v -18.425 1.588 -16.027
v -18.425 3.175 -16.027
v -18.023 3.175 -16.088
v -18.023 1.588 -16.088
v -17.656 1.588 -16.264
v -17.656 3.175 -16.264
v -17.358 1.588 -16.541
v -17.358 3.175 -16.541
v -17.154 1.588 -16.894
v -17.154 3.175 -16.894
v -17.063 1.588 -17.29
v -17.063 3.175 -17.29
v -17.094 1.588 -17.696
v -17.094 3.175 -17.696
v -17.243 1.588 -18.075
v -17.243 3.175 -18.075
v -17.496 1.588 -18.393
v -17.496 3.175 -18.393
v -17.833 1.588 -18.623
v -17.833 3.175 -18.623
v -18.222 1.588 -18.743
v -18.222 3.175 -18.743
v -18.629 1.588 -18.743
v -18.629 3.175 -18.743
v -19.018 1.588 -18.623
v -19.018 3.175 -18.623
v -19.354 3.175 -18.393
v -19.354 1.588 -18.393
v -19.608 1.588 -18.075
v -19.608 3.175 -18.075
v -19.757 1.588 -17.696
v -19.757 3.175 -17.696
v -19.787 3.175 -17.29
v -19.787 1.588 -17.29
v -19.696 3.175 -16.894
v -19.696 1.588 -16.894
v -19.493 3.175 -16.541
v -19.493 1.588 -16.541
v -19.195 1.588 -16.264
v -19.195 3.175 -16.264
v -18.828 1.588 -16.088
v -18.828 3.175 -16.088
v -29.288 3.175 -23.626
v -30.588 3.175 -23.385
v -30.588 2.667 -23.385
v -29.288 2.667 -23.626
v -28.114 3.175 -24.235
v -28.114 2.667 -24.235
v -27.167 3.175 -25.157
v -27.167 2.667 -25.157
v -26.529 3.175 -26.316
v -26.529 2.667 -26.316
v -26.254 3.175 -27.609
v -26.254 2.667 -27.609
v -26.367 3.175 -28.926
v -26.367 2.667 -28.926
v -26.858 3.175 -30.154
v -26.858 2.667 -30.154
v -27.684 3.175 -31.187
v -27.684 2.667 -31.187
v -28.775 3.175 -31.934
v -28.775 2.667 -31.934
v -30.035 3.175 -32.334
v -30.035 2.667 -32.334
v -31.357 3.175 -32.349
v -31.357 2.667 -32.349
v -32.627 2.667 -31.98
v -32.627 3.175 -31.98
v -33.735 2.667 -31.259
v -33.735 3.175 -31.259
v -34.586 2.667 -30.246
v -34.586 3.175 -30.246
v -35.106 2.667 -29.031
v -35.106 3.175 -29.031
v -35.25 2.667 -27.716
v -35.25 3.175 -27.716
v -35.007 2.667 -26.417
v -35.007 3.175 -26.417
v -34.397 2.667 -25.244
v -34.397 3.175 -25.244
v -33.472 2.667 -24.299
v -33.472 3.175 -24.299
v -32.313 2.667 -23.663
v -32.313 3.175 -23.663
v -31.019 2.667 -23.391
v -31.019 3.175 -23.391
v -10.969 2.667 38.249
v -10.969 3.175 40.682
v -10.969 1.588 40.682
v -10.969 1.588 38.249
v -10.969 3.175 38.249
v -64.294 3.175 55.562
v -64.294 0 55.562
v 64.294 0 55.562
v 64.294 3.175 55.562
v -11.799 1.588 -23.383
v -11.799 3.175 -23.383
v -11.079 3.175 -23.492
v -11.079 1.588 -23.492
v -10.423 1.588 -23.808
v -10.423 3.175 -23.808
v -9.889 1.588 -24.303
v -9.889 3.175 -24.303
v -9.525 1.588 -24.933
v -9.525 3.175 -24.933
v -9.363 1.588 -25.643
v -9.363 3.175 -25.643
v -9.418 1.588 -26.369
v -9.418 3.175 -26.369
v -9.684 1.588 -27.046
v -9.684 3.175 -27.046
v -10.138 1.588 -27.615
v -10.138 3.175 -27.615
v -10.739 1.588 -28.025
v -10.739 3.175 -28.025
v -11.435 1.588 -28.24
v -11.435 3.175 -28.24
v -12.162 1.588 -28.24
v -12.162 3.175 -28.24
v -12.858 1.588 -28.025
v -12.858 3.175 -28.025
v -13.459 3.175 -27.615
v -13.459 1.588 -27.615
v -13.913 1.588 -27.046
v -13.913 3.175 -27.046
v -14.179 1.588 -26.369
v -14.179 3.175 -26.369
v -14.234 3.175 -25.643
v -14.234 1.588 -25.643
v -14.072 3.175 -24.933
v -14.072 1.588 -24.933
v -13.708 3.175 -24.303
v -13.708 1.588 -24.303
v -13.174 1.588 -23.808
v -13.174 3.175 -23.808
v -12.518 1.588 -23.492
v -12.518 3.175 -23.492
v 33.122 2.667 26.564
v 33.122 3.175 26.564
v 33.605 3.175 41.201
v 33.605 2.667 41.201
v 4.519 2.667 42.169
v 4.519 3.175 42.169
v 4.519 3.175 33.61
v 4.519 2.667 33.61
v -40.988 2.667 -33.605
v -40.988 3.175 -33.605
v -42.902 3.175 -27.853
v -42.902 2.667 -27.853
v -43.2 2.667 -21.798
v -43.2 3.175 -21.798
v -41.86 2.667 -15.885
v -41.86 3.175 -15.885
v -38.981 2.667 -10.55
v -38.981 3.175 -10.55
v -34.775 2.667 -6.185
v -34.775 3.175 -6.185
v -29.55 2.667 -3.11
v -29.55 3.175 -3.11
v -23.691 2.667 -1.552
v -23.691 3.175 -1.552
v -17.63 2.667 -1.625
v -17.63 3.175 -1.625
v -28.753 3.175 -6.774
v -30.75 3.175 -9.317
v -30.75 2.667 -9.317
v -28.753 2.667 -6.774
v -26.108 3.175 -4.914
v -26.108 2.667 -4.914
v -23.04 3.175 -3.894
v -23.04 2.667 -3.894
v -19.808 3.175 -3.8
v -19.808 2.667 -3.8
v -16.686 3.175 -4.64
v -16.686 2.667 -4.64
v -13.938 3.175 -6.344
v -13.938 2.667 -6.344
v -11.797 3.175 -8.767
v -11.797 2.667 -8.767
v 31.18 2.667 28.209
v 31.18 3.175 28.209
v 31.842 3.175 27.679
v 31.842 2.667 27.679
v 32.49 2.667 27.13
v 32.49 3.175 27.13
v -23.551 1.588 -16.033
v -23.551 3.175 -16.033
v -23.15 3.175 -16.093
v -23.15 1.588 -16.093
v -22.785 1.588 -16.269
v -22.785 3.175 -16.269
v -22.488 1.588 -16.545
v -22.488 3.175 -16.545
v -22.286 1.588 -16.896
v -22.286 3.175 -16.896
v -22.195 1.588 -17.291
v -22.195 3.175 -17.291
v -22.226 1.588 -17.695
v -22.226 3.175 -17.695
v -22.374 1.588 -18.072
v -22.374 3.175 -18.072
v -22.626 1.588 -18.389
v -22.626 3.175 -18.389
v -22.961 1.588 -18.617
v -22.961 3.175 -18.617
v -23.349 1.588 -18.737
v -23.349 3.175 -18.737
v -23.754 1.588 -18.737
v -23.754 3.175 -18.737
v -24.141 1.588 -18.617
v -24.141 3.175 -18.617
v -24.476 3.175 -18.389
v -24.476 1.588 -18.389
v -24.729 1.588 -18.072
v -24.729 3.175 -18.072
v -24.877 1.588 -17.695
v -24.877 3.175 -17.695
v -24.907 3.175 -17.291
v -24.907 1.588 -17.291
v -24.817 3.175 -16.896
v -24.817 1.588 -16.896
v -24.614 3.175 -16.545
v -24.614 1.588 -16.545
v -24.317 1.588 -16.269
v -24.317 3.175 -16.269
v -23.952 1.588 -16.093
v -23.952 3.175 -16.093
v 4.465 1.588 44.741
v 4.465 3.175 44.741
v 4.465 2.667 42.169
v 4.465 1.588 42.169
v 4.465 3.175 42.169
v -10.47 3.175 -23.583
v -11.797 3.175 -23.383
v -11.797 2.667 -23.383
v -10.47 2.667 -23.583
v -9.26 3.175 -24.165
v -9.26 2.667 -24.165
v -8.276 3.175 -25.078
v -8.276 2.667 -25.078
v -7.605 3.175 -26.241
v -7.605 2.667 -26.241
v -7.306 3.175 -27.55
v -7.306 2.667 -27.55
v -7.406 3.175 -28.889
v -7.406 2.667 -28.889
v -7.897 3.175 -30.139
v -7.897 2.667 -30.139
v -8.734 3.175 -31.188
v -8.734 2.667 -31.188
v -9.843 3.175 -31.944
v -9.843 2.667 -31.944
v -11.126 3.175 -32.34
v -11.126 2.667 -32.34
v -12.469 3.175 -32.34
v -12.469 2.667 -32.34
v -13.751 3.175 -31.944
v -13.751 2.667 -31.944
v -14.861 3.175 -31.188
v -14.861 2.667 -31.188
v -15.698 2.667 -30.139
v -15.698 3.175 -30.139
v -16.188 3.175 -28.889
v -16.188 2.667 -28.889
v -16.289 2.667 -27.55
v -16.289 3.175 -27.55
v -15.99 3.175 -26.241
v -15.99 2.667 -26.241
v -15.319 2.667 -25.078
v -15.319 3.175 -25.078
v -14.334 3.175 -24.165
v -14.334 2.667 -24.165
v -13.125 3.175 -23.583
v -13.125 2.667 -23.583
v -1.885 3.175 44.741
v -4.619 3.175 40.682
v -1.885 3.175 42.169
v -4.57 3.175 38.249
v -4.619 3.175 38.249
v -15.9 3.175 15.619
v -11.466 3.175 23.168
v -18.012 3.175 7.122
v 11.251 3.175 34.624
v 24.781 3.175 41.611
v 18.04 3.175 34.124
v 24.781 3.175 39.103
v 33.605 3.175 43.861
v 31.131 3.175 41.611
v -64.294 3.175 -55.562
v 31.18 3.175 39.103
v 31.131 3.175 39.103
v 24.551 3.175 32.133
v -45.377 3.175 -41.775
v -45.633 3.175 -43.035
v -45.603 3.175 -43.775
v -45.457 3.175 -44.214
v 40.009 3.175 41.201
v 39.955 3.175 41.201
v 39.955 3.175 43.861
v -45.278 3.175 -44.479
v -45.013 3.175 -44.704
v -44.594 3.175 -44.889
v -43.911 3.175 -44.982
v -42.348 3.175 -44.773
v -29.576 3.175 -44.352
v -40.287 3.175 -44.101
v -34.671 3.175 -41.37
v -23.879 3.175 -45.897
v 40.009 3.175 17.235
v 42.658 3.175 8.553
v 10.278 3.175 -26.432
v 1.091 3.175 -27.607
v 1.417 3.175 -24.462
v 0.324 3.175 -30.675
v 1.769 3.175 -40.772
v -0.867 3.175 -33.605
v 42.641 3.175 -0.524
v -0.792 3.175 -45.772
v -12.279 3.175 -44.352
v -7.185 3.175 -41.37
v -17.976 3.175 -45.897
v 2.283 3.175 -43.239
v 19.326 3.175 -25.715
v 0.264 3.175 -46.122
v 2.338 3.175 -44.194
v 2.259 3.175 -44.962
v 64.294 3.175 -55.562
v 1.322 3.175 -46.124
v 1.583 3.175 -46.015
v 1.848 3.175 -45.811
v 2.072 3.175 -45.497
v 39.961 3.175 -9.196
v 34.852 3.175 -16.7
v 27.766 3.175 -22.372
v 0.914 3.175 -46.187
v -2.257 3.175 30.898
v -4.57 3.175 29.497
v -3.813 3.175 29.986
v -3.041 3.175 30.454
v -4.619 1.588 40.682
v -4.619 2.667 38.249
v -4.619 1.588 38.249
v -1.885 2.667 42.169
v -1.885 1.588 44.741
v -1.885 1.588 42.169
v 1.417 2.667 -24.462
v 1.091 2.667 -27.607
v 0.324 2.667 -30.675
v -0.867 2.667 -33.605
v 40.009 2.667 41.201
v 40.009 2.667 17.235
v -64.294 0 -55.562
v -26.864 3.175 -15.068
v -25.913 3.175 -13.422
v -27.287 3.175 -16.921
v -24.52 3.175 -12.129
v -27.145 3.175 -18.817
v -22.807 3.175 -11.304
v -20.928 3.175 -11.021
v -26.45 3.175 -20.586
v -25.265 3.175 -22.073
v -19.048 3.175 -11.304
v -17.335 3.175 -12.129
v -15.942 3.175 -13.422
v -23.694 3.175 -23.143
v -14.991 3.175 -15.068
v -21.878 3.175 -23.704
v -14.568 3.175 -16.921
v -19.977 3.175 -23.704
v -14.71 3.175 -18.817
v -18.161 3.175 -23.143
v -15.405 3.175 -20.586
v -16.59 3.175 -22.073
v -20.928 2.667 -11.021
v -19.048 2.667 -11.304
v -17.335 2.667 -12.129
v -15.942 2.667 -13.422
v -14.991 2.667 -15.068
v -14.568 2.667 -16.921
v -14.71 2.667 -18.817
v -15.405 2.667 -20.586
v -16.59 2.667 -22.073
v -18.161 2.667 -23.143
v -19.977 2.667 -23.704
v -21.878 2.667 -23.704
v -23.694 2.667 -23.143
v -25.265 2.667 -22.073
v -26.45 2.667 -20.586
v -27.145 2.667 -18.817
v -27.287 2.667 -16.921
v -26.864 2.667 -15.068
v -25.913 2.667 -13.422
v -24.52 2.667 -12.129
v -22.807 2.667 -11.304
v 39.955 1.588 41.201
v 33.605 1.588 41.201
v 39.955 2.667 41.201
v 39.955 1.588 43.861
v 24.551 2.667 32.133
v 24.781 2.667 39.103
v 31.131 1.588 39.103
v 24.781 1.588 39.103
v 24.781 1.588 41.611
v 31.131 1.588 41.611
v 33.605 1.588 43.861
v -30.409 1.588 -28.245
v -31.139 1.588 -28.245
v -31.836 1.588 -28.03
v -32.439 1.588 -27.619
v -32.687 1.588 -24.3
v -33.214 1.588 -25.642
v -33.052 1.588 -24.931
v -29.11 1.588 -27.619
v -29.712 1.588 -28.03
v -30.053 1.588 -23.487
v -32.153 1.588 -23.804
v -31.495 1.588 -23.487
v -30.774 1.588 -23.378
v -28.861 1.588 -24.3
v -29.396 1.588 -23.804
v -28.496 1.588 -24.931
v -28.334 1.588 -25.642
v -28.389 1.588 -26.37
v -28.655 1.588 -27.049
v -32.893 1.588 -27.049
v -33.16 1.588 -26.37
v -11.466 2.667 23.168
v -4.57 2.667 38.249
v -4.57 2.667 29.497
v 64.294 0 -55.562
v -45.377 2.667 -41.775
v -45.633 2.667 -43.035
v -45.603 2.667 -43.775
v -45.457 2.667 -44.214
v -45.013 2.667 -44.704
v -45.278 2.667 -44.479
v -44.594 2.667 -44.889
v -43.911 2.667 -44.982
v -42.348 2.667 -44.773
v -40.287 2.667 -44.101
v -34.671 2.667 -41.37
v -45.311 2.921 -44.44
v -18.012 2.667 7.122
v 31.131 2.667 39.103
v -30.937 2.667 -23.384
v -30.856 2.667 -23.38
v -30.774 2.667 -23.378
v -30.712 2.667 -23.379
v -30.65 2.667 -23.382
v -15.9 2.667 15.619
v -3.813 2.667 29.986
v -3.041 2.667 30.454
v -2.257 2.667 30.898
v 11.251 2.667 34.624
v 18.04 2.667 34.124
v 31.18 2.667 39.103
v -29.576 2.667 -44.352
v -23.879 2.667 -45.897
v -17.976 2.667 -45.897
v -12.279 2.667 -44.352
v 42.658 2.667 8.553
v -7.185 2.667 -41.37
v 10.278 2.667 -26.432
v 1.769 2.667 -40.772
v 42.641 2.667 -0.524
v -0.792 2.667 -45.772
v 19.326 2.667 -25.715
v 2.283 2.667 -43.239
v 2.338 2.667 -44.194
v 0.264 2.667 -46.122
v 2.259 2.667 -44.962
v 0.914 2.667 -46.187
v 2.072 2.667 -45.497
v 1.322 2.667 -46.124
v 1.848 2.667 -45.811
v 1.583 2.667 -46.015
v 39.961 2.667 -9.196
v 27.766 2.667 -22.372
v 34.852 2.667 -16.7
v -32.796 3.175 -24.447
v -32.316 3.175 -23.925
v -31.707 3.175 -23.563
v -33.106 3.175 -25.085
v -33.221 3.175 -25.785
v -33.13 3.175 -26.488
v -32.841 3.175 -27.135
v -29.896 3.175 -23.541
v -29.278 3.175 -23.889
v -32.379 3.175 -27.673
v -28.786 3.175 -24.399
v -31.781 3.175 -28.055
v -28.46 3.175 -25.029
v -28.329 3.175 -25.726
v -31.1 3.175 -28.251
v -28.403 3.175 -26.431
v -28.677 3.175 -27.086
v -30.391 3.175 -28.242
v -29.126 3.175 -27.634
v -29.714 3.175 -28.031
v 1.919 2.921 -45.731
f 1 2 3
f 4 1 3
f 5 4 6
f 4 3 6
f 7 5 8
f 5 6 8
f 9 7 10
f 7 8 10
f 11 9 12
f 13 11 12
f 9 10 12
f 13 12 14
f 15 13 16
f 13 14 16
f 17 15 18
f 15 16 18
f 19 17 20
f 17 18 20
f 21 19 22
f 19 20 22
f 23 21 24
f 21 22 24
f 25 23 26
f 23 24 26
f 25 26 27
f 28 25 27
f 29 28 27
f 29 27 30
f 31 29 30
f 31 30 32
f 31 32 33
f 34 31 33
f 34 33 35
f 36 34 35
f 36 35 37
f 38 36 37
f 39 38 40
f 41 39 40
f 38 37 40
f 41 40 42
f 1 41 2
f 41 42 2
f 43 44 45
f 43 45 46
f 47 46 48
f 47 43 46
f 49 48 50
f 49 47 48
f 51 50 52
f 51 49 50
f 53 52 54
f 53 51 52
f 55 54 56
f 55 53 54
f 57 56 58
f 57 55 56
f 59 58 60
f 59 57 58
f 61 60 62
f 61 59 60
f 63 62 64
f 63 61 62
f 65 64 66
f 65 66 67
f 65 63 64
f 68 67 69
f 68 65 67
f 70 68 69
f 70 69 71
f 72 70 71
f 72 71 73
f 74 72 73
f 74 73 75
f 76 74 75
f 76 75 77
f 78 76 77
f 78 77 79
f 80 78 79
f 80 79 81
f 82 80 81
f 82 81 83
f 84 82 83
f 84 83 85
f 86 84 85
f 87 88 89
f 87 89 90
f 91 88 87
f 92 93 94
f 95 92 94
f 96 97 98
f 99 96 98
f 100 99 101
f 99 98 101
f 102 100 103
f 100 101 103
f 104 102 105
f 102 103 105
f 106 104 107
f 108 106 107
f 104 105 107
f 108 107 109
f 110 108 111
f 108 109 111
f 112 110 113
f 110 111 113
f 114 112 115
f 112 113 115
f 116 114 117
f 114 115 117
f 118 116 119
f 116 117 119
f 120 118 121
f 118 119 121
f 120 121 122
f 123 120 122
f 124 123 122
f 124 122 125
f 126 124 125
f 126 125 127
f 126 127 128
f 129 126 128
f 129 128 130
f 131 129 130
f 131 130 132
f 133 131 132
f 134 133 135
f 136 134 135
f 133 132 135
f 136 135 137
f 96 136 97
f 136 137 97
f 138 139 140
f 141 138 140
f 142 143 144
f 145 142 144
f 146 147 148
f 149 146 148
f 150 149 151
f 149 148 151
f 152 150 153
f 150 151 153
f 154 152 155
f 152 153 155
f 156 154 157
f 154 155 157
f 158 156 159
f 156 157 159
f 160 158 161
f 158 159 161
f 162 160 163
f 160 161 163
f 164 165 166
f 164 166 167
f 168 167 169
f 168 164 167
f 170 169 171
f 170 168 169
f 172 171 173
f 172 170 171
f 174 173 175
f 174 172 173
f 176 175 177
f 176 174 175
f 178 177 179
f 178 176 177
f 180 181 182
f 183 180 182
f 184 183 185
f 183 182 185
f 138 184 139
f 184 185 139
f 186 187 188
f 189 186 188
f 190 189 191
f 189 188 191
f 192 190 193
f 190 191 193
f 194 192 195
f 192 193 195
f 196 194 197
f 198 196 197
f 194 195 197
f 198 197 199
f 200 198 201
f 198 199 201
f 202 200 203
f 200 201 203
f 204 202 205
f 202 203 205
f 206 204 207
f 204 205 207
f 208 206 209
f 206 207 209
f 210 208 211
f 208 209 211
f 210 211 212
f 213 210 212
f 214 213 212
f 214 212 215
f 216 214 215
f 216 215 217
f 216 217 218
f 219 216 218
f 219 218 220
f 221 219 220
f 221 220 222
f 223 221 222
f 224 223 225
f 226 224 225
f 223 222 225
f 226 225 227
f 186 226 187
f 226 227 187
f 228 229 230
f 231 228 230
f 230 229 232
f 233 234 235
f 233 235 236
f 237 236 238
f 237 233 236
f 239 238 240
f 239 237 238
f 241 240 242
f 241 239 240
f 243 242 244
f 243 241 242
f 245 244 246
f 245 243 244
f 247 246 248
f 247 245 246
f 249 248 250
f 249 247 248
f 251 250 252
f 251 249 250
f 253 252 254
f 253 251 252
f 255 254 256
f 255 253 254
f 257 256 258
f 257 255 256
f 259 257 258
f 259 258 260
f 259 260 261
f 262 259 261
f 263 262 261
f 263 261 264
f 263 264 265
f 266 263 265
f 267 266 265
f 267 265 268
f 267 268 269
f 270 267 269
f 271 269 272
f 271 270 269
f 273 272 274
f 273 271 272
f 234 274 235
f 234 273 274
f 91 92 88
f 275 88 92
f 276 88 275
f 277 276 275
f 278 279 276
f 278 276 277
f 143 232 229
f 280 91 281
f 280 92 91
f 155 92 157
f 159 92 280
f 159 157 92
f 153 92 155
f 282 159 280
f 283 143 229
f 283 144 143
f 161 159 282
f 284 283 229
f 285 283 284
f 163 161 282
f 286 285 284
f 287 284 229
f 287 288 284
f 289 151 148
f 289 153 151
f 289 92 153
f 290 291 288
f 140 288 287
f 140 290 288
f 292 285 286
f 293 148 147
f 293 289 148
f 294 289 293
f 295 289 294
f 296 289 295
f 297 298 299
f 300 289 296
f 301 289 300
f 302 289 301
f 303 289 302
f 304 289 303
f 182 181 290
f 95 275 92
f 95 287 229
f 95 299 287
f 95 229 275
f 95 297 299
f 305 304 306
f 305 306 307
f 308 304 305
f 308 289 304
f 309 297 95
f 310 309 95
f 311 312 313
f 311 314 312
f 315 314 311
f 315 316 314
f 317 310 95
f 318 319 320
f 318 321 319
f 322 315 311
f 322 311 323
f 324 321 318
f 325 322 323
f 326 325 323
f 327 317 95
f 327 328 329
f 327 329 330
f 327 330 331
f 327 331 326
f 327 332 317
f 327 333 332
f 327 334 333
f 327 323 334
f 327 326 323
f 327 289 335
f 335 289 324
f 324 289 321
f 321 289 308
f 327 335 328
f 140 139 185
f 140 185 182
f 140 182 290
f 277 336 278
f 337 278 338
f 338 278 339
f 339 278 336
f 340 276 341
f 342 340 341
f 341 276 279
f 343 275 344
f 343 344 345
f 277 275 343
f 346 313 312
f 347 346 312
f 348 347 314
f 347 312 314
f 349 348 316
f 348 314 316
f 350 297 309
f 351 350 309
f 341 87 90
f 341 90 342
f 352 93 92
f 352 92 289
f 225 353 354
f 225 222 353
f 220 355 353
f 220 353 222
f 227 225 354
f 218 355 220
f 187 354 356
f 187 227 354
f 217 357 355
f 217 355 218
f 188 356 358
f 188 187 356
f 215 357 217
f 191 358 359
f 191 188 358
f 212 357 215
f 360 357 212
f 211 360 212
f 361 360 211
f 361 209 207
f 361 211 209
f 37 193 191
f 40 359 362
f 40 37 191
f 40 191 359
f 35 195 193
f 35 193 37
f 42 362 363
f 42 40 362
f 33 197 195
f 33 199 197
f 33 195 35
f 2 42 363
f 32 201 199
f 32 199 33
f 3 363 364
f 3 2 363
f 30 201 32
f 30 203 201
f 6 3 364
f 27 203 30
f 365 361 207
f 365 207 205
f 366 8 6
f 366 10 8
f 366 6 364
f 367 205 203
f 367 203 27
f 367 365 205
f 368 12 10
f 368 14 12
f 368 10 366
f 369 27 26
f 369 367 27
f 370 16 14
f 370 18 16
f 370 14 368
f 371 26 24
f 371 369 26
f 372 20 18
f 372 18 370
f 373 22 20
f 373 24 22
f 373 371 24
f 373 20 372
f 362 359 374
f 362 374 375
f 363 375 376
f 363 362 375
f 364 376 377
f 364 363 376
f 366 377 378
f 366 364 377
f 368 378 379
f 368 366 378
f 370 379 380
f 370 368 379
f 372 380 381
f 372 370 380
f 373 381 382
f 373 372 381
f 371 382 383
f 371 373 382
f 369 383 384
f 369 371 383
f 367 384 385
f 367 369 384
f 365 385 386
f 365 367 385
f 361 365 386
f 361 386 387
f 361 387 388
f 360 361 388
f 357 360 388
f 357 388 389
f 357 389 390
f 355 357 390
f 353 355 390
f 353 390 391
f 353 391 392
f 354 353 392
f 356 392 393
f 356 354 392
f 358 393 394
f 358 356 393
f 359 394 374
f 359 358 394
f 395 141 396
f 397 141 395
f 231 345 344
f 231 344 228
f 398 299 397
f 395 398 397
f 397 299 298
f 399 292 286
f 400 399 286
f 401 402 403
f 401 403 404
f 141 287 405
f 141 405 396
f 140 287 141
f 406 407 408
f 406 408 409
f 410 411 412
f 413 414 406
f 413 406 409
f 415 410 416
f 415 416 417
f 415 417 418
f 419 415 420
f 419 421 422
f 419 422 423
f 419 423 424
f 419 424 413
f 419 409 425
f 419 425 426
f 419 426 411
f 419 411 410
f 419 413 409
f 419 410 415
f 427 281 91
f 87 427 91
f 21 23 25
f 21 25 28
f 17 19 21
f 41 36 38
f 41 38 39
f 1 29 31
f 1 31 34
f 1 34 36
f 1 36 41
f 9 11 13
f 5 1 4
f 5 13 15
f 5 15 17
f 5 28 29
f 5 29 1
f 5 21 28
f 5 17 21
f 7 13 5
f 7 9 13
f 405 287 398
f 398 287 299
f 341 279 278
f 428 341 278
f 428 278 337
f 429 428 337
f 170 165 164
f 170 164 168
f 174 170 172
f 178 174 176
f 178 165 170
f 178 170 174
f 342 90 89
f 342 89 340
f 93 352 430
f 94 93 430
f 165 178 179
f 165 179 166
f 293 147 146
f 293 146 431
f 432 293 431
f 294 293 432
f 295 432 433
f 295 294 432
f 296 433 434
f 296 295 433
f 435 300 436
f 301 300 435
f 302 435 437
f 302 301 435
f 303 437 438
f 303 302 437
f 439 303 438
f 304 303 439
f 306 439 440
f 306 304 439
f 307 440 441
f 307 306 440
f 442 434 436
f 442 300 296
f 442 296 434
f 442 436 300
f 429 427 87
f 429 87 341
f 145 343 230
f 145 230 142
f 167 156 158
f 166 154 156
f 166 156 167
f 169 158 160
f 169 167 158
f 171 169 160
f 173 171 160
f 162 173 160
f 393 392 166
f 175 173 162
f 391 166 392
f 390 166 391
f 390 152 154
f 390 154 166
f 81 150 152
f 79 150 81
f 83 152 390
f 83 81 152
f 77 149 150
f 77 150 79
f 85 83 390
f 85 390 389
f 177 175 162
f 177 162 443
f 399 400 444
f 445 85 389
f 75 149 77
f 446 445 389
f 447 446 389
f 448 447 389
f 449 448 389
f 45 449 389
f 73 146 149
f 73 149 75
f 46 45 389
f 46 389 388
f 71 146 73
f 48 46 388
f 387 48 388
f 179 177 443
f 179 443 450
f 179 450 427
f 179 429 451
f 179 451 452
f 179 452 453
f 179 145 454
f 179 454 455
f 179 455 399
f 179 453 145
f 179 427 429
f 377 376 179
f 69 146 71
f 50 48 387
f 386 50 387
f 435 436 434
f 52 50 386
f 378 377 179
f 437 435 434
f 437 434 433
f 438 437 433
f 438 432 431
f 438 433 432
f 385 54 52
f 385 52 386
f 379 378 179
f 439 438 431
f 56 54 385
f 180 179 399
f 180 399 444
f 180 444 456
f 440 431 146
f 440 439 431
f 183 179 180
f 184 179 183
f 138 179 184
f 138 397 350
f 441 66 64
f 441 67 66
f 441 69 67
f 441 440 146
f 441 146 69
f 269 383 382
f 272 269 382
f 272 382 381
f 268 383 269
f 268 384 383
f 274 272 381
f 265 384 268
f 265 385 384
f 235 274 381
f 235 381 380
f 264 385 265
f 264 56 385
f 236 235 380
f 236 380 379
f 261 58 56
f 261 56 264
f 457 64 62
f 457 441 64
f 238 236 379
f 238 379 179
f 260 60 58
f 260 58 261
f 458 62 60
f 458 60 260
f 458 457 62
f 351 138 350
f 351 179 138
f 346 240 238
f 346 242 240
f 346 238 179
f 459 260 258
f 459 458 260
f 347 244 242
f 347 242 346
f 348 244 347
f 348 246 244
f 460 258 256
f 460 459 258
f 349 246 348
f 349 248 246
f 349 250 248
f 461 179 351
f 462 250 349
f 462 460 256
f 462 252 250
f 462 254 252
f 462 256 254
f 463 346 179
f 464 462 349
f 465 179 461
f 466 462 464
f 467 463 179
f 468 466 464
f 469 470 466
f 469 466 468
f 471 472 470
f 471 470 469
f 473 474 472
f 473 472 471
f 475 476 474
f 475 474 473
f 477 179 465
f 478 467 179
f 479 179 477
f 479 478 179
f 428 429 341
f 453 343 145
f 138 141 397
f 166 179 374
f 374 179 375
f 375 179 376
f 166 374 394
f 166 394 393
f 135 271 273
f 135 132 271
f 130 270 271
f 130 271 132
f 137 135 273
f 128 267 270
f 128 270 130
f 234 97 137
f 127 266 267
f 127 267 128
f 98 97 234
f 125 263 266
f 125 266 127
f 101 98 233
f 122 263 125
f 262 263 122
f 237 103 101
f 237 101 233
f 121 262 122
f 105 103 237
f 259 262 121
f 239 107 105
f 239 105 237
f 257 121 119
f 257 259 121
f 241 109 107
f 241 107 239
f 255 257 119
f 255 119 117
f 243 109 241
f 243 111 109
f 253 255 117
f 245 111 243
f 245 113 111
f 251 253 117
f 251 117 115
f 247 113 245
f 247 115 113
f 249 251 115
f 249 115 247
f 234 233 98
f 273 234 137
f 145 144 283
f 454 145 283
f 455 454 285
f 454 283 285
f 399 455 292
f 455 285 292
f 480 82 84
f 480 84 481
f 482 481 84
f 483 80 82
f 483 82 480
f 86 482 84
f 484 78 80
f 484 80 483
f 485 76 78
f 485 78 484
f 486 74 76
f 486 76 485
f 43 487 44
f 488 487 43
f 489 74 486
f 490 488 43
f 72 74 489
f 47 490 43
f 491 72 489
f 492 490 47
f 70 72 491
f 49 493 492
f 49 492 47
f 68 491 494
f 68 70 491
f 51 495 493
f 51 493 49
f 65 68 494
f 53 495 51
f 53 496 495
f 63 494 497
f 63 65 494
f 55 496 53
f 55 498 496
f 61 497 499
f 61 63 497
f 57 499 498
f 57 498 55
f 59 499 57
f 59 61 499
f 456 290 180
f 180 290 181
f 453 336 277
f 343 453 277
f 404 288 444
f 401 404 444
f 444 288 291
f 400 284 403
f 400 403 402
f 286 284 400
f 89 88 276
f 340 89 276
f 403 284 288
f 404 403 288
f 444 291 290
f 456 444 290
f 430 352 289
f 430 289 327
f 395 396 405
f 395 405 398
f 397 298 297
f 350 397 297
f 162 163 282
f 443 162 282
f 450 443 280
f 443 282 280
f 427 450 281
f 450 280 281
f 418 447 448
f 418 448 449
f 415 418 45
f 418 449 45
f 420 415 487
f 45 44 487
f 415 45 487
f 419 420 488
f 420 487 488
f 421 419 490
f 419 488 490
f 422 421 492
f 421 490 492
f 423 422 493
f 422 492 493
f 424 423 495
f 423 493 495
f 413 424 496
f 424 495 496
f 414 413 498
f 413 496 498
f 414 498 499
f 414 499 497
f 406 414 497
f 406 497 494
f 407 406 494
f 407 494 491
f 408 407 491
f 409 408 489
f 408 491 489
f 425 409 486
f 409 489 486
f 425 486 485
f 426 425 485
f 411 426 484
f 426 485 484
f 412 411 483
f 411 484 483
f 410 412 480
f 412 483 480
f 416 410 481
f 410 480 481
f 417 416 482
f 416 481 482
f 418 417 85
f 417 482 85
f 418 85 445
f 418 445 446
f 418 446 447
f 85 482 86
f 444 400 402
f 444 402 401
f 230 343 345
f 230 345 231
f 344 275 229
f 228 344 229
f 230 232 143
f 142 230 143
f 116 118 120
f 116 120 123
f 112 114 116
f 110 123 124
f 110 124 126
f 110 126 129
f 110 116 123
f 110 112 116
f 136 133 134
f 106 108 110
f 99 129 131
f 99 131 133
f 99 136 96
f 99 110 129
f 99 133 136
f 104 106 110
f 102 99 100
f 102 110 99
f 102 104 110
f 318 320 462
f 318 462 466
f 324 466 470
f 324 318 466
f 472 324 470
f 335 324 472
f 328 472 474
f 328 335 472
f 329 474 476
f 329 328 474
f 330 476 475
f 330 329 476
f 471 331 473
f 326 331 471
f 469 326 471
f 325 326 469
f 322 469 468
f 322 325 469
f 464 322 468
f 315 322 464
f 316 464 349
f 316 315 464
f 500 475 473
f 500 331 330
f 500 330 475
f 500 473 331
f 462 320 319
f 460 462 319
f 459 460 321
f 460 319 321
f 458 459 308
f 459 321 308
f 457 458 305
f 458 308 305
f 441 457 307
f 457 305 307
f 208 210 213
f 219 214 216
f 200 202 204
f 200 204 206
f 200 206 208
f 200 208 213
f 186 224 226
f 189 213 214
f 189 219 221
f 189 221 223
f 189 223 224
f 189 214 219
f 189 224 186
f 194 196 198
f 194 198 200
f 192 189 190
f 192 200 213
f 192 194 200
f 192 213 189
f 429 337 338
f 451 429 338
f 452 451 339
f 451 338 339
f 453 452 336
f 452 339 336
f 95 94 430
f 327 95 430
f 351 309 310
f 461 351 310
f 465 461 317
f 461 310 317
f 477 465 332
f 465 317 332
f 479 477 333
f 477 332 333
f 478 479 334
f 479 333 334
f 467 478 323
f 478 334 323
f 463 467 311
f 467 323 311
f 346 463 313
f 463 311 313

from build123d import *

# Parameters (mm, degrees)
SKETCH1_W           = 128.5875
SKETCH1_H           = 111.125
BOSS_EXTRUDE1_DEPTH = 3.175
SKETCH2_R           = 4.503964563
SKETCH2_R_2         = 6.377074628
CUT_EXTRUDE1_DEPTH  = 0.508
SKETCH4_R           = 2.446965281
SKETCH4_R_2         = 2.441870248
SKETCH4_R_3         = 1.365573368
SKETCH4_R_4         = 1.359710966
SKETCH4_W           = 6.35
SKETCH4_H           = 2.432656747
SKETCH4_H_2         = 2.571304572
SKETCH4_H_3         = 2.507941143
SKETCH4_H_4         = 2.659157088
CUT_EXTRUDE11_DEPTH = 1.5875


with BuildPart() as part:
    # Sketch1 → Boss-Extrude1 (new body)
    with BuildSketch(Plane(origin=(0, 0, 0), x_dir=(1, 0, 0), z_dir=(0, 1, 0))):
        Rectangle(SKETCH1_W, SKETCH1_H)
    extrude(amount=BOSS_EXTRUDE1_DEPTH)

    # Sketch2 → Cut-Extrude1 (cut)
    with BuildSketch(Plane(origin=(0, 3.175, 0), x_dir=(1, 0, 0), z_dir=(0, 1, 0))):
        with BuildLine():
            Line((-11.466221212, -23.168163392), (-10.968659983, -38.249198381))
            Line((-10.968659983, -38.249198381), (-4.570137716, -38.249198381))
            Line((-4.570137716, -38.249198381), (-4.570137716, -29.496558138))
            ThreePointArc((-4.570137716, -29.496558138), (-3.428830963, -30.22282284), (-2.256517086, -30.897894461))
            Line((-2.256517086, -30.897894461), (-1.884638787, -42.169491419))
            Line((-1.884638787, -42.169491419), (4.518768835, -42.169491419))
            Line((4.518768835, -42.169491419), (4.518768835, -33.609716863))
            ThreePointArc((4.518768835, -33.609716863), (14.659430985, -34.563354284), (24.550701184, -32.133286996))
            Line((24.550701184, -32.133286996), (24.780651804, -39.103069122))
            Line((24.780651804, -39.103069122), (31.179561384, -39.103069122))
            Line((31.179561384, -39.103069122), (31.179561384, -28.20870534))
            ThreePointArc((31.179561384, -28.20870534), (32.167865558, -27.406768429), (33.121940536, -26.564397437))
            Line((33.121940536, -26.564397437), (33.604851579, -41.201386667))
            Line((33.604851579, -41.201386667), (40.008784891, -41.201386667))
            Line((40.008784891, -41.201386667), (40.008784891, -17.235252664))
            ThreePointArc((40.008784891, -17.235252664), (34.852114754, 16.699623637), (1.416829228, 24.461630995))
            ThreePointArc((1.416829228, 24.461630995), (0.762007357, 29.154919286), (-0.867318981, 33.604755502))
            add(Edge.make_bspline(
                [(-7.184604133, 41.369579914), (7.863520936, 53.974007146), (-0.867318981, 33.604755502)],
                knots=[0, 0, 0, 1, 1, 1], degree=2))
            ThreePointArc((-7.184604133, 41.369579914), (-20.92757631, 46.092568948), (-34.670548488, 41.369579914))
            add(Edge.make_bspline(
                [(-40.987833639, 33.604755502), (-52.791869615, 51.393160856), (-34.670548488, 41.369579914)],
                knots=[0, 0, 0, 1, 1, 1], degree=2))
            ThreePointArc((-40.987833639, 33.604755502), (-38.980914938, 10.550215331), (-17.629643976, 1.624814864))
            ThreePointArc((-17.629643976, 1.624814864), (-17.261411086, -11.446232799), (-11.466221212, -23.168163392))
        make_face()
        with Locations((-11.797256967, 27.886542178)):
            Circle(SKETCH2_R, mode=Mode.SUBTRACT)
        with Locations((-30.749586512, 27.886542178)):
            Circle(SKETCH2_R, mode=Mode.SUBTRACT)
        with BuildLine():
            ThreePointArc((-11.797256967, 8.766728526), (-21.427716956, 3.728530924), (-30.749586512, 9.317085534))
            Line((-30.749586512, 9.317085534), (-11.797256967, 8.766728526))
        make_face(mode=Mode.SUBTRACT)
        with Locations((-20.92757631, 17.39779757)):
            Circle(SKETCH2_R_2, mode=Mode.SUBTRACT)
    extrude(amount=-CUT_EXTRUDE1_DEPTH, mode=Mode.SUBTRACT)

    # Sketch4 → Cut-Extrude11 (cut)
    with BuildSketch(Plane(origin=(0, 3.175, 0), x_dir=(1, 0, 0), z_dir=(0, 1, 0))):
        with Locations((-30.774197511, 25.825339041)):
            Circle(SKETCH4_R)
        with Locations((-11.798514882, 25.825339041)):
            Circle(SKETCH4_R_2)
        with Locations((-18.425247422, 17.392416095)):
            Circle(SKETCH4_R_3)
        with Locations((-23.55125419, 17.392416095)):
            Circle(SKETCH4_R_4)
        with Locations((-7.793659983, -39.465526755)):
            Rectangle(SKETCH4_W, SKETCH4_H)
        with Locations((1.290361213, -43.455143705)):
            Rectangle(SKETCH4_W, SKETCH4_H_2)
        with Locations((27.955651804, -40.357039693)):
            Rectangle(SKETCH4_W, SKETCH4_H_3)
        with Locations((36.779851579, -42.530965211)):
            Rectangle(SKETCH4_W, SKETCH4_H_4)
    extrude(amount=-CUT_EXTRUDE11_DEPTH, mode=Mode.SUBTRACT)


solid = part.part
